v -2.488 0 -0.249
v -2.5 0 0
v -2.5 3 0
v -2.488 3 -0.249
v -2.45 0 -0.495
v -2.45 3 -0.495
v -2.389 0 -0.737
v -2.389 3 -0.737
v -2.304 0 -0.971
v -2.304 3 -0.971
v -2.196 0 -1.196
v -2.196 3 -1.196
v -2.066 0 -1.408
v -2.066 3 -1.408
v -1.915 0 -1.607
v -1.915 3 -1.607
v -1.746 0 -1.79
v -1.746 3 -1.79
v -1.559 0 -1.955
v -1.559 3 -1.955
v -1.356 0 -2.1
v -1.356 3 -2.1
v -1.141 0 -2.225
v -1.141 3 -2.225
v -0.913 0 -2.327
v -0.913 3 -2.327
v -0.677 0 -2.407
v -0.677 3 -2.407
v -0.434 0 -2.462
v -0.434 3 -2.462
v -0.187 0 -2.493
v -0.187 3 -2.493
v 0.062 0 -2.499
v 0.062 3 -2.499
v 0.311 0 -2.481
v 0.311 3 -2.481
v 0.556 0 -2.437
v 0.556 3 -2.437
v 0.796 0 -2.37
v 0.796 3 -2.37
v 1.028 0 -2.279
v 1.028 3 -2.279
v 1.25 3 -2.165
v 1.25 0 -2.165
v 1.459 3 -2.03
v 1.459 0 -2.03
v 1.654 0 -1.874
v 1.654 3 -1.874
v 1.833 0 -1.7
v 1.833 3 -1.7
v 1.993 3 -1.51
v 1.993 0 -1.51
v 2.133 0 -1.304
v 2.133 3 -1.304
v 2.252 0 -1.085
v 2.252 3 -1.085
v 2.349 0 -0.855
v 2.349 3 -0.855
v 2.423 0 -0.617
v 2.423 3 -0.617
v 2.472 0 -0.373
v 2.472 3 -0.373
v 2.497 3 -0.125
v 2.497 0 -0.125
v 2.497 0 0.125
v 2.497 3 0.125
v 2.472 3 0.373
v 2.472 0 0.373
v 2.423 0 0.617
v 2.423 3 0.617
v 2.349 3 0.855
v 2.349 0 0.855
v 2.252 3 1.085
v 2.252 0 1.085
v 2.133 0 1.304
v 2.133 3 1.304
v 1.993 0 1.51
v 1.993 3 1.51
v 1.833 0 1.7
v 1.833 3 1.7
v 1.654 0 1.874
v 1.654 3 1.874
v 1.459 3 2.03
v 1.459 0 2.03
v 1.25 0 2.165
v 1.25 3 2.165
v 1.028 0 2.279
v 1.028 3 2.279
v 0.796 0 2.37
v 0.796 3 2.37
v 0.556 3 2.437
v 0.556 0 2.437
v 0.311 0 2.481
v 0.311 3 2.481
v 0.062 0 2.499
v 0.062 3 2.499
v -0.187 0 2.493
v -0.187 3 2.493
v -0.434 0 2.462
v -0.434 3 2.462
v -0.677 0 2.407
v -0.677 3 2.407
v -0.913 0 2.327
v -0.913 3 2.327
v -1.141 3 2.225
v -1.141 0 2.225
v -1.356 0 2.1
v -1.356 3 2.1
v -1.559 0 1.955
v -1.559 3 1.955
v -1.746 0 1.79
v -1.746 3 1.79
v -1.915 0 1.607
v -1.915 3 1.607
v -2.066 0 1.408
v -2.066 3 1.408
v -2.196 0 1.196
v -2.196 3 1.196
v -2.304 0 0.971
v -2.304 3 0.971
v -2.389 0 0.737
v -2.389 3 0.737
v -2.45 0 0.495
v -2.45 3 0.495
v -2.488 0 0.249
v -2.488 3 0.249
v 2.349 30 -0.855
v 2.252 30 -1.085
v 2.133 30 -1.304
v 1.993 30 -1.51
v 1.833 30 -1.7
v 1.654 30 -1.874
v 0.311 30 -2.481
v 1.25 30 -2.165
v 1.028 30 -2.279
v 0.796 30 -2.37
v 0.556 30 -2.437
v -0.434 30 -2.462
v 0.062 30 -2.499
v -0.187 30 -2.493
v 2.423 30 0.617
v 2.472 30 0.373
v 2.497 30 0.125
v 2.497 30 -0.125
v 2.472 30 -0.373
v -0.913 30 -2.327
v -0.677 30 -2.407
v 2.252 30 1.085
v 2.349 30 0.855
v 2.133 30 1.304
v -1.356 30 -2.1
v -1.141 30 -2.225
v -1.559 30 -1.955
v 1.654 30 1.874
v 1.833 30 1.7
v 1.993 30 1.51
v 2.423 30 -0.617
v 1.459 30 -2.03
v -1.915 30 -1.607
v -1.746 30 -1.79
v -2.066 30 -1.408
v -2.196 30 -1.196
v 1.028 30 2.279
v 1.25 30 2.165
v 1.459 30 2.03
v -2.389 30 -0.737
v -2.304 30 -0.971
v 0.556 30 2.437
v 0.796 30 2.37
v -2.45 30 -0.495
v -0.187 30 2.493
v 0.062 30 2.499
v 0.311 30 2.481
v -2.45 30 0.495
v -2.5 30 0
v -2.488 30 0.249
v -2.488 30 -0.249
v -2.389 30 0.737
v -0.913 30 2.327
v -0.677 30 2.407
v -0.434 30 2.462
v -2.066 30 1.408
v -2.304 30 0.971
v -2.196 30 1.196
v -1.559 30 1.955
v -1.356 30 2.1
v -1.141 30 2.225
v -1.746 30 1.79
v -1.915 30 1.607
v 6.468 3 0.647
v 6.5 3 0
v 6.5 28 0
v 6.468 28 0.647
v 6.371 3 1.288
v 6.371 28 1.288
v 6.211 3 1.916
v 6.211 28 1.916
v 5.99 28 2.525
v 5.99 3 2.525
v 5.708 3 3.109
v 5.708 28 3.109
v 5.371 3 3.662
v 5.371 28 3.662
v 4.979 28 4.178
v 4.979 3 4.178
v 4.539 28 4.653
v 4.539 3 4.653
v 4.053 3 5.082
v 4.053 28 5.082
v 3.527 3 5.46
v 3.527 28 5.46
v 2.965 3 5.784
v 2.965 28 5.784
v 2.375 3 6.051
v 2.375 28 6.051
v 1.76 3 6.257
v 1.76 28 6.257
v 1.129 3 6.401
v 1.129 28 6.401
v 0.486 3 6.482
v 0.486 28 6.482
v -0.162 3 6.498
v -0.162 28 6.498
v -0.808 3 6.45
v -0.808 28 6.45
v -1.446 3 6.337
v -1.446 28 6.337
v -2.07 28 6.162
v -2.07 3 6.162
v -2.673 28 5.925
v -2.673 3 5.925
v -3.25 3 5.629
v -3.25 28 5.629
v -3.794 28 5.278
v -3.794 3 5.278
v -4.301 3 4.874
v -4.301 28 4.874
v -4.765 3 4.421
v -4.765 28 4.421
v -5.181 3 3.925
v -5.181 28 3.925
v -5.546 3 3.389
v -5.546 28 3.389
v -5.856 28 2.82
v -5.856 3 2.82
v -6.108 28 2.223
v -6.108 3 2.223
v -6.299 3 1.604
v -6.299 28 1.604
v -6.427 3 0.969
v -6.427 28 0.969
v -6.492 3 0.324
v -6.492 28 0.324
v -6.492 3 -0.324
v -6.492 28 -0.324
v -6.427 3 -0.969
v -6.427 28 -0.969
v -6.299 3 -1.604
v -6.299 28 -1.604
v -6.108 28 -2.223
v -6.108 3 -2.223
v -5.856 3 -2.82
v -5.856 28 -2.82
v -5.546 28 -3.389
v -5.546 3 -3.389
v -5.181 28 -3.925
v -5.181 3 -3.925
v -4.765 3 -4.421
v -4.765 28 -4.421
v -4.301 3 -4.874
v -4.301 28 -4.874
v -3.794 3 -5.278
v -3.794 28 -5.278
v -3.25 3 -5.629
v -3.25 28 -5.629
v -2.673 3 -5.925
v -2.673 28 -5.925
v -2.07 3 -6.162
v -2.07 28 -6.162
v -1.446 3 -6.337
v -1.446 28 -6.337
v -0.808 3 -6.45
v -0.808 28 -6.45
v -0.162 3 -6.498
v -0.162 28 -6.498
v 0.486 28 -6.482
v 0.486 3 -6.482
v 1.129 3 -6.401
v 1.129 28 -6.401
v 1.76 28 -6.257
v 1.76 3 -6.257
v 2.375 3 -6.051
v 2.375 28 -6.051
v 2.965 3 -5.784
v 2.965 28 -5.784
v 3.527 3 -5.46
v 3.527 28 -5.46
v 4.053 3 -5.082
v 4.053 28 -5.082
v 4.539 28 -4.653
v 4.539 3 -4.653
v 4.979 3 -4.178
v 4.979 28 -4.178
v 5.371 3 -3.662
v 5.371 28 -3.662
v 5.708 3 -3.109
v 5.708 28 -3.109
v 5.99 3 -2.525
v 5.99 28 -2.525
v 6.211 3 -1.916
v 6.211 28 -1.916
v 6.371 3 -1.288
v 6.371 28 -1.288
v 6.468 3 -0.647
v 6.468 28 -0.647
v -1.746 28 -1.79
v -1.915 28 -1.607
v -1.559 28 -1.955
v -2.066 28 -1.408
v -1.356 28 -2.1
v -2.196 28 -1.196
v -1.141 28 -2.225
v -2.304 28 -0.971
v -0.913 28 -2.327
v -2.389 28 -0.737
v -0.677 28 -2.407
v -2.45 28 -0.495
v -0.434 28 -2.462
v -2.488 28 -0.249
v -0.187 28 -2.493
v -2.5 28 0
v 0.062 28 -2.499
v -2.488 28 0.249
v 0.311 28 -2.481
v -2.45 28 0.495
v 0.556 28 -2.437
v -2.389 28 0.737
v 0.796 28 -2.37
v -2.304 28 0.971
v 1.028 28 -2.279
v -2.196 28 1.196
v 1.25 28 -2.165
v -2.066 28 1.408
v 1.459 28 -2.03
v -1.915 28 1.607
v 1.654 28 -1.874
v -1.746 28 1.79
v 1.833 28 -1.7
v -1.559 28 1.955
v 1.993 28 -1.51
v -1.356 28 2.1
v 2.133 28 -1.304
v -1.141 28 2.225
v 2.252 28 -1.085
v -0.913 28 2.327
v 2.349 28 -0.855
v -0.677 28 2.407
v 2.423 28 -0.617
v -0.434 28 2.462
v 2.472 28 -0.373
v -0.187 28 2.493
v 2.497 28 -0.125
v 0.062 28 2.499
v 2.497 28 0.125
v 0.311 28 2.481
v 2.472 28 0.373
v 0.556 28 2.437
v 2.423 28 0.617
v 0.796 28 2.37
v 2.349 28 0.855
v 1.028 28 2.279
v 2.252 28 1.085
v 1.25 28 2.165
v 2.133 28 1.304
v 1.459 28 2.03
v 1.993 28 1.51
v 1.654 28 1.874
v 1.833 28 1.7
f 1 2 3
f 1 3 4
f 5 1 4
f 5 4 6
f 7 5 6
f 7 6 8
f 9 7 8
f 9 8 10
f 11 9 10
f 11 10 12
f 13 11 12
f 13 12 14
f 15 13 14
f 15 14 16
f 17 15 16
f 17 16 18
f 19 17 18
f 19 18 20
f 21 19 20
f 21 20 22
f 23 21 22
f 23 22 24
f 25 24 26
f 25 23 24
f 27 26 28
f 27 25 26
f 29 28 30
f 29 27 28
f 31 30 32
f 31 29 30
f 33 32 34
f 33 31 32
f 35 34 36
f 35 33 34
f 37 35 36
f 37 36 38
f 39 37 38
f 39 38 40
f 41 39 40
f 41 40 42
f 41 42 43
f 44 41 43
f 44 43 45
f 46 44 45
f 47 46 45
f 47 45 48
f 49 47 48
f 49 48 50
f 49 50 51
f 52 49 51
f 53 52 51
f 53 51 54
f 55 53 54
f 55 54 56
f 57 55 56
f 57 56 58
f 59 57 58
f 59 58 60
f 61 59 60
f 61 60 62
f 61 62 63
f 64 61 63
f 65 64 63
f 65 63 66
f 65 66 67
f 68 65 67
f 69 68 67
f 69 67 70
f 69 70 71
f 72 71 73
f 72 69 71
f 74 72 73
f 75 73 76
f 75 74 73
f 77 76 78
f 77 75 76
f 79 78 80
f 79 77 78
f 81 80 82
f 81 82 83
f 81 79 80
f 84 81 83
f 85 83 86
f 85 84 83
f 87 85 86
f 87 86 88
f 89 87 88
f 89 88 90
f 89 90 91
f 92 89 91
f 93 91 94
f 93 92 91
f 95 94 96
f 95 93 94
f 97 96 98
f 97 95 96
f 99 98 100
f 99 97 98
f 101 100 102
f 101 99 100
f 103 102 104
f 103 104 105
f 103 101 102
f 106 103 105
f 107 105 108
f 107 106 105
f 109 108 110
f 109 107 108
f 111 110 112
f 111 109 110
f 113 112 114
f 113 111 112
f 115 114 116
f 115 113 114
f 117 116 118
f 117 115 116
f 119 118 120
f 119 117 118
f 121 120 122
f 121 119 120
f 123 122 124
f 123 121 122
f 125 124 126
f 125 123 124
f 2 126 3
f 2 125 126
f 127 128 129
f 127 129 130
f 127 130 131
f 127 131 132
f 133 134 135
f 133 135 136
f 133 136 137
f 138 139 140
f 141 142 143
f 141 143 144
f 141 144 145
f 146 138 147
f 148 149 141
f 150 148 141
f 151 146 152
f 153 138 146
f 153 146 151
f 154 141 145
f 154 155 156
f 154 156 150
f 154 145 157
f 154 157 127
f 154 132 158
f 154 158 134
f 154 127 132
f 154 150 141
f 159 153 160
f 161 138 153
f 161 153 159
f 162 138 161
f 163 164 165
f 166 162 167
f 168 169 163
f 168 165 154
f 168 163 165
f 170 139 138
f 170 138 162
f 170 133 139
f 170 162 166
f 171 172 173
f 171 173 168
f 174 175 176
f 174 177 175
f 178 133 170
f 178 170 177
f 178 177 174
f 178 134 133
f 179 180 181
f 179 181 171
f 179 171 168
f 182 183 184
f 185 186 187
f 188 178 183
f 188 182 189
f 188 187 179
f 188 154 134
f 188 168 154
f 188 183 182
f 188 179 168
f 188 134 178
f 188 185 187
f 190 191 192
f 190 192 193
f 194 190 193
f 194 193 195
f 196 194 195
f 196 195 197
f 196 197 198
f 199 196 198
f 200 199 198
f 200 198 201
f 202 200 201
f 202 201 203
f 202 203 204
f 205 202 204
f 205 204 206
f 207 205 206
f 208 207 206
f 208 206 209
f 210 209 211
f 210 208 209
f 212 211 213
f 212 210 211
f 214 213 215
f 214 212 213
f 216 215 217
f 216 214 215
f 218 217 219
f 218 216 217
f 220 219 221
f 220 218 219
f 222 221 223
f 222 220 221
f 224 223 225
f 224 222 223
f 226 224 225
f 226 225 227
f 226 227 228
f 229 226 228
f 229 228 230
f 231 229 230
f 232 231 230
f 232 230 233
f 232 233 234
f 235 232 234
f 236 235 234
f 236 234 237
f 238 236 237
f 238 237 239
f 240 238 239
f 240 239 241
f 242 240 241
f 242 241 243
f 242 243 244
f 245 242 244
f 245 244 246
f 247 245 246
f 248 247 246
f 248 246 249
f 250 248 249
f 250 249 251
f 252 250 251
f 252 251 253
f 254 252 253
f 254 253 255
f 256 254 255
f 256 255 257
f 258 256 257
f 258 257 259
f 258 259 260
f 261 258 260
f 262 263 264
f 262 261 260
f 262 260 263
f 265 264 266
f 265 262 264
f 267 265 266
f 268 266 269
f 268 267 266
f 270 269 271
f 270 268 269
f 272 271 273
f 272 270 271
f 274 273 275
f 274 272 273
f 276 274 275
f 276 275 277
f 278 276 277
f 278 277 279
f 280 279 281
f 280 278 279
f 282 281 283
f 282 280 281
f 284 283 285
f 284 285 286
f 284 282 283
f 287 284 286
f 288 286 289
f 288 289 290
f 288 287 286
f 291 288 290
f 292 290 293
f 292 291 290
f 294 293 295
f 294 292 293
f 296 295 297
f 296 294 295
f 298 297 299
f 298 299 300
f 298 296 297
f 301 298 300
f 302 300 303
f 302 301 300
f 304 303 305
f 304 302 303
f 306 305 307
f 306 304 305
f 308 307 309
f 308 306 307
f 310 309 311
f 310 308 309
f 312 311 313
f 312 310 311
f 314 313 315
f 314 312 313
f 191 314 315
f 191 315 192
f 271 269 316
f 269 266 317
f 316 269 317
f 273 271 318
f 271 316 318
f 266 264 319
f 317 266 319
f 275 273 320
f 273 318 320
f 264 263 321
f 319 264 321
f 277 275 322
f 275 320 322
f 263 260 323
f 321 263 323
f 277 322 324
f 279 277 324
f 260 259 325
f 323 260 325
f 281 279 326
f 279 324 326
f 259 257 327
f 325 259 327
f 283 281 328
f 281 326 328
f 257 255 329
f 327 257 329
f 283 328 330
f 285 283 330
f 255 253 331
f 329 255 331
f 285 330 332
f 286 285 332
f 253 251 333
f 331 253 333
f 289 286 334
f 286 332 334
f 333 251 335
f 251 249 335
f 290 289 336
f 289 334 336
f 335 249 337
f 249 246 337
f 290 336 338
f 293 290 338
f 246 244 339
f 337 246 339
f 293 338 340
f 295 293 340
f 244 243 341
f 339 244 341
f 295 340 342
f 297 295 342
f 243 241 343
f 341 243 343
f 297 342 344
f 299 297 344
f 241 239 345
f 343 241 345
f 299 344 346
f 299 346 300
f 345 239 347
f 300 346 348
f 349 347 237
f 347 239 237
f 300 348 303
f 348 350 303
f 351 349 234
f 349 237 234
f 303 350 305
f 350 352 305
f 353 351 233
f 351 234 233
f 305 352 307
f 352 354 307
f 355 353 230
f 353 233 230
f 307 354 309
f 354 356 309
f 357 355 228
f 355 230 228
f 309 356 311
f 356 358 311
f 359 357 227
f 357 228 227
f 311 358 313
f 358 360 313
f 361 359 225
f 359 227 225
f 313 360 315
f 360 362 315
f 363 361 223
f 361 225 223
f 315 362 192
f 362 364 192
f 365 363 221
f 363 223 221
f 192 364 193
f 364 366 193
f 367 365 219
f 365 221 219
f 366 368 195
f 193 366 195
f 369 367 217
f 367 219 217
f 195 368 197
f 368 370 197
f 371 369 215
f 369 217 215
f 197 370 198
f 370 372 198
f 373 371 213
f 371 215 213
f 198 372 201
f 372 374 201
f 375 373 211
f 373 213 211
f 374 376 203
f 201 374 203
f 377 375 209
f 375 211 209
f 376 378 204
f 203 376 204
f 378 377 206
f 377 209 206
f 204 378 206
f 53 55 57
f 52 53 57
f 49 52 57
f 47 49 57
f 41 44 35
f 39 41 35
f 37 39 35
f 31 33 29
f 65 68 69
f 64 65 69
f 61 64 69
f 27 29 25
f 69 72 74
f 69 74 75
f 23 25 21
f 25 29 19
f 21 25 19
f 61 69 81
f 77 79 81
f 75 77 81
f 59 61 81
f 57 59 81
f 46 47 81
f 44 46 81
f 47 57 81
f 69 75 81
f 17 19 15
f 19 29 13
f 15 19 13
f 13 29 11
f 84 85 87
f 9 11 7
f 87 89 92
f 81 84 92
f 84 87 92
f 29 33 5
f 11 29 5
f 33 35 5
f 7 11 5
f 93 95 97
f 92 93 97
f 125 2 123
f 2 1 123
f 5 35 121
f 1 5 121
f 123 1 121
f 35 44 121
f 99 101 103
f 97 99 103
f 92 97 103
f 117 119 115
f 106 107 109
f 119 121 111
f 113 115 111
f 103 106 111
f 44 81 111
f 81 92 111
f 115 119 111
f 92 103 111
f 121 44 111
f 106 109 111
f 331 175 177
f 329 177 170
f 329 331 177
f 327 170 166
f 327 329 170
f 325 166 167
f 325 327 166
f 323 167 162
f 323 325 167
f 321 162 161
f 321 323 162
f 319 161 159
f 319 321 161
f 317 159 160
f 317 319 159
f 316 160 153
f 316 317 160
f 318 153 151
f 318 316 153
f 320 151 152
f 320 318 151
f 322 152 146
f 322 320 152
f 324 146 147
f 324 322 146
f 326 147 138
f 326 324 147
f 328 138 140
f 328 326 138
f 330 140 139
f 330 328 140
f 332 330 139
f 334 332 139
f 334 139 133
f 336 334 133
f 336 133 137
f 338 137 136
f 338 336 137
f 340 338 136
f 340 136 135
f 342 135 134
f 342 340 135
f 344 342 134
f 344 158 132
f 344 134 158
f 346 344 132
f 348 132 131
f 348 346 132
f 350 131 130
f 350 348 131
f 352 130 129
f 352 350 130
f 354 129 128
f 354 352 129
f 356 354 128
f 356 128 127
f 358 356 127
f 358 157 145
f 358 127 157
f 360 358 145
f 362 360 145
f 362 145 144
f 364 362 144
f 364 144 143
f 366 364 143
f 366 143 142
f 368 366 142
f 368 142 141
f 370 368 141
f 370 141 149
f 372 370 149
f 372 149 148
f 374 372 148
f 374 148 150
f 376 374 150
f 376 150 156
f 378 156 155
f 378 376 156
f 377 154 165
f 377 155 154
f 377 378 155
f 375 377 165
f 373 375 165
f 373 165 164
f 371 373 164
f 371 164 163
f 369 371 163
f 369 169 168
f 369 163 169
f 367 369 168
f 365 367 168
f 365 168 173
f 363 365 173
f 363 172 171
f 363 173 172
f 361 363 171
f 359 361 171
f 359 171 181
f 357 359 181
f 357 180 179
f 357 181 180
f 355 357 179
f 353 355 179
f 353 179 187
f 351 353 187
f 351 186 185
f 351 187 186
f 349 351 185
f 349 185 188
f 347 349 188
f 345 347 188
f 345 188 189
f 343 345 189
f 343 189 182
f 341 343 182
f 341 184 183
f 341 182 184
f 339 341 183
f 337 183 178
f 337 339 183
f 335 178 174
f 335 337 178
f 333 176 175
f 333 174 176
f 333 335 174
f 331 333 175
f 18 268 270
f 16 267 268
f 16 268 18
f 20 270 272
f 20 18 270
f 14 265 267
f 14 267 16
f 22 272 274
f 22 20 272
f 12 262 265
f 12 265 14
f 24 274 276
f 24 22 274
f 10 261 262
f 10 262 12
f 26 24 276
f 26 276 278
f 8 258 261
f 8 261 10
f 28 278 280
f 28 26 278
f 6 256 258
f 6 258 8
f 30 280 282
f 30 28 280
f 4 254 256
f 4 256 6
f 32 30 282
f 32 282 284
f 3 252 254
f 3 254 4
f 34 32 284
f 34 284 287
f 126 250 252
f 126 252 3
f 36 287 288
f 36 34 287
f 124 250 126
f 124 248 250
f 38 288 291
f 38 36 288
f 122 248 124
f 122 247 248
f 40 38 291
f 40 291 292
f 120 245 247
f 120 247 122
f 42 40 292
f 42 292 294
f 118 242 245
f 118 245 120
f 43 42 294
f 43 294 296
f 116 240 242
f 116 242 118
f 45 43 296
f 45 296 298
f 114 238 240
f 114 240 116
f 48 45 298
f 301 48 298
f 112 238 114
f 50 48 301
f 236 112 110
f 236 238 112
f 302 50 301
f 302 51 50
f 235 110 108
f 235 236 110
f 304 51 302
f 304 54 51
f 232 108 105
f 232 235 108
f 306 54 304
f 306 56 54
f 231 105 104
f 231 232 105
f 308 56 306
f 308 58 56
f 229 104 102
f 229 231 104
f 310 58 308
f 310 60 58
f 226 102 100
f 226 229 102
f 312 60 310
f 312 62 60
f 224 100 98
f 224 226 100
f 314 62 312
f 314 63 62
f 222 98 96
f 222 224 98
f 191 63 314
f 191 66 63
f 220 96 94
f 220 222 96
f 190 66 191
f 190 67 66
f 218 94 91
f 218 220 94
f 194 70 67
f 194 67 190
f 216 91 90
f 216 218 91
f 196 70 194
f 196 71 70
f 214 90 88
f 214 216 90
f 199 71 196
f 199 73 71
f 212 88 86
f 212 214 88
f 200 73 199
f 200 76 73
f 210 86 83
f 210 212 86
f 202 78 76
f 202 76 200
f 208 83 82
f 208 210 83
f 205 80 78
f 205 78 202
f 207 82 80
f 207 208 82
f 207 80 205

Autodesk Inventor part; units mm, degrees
ref_plane "YZ Plane" through (0, 0, 0) normal (1, 0, 0) x (0, 1, 0)
ref_plane "XZ Plane" through (0, 0, 0) normal (0, 1, 0) x (-1, 0, 0)
ref_plane "XY Plane" through (0, 0, 0) normal (0, 0, 1) x (1, 0, 0)
sketch "Sketch1" plane through (0, 0, 0) normal (0, 1, 0) x (-1, 0, 0)
  circle A0 centre (0, 0) radius 2.5
  dimension "d0" = 5
extrude "Extrusion1" add sketch "Sketch1" along normal blind 30
ref_plane "Work Plane1" through (0, 3, 0) normal (0, -1, 0) x (1, 0, 0)
sketch "Sketch2" plane through (0, 3, 0) normal (0, -1, 0) x (1, 0, 0)
  circle A0 centre (0, 0) radius 6.5
  dimension "d4" = 13
extrude "Extrusion2" add sketch "Sketch2" against normal blind 25
properties part number "3D-roller"
